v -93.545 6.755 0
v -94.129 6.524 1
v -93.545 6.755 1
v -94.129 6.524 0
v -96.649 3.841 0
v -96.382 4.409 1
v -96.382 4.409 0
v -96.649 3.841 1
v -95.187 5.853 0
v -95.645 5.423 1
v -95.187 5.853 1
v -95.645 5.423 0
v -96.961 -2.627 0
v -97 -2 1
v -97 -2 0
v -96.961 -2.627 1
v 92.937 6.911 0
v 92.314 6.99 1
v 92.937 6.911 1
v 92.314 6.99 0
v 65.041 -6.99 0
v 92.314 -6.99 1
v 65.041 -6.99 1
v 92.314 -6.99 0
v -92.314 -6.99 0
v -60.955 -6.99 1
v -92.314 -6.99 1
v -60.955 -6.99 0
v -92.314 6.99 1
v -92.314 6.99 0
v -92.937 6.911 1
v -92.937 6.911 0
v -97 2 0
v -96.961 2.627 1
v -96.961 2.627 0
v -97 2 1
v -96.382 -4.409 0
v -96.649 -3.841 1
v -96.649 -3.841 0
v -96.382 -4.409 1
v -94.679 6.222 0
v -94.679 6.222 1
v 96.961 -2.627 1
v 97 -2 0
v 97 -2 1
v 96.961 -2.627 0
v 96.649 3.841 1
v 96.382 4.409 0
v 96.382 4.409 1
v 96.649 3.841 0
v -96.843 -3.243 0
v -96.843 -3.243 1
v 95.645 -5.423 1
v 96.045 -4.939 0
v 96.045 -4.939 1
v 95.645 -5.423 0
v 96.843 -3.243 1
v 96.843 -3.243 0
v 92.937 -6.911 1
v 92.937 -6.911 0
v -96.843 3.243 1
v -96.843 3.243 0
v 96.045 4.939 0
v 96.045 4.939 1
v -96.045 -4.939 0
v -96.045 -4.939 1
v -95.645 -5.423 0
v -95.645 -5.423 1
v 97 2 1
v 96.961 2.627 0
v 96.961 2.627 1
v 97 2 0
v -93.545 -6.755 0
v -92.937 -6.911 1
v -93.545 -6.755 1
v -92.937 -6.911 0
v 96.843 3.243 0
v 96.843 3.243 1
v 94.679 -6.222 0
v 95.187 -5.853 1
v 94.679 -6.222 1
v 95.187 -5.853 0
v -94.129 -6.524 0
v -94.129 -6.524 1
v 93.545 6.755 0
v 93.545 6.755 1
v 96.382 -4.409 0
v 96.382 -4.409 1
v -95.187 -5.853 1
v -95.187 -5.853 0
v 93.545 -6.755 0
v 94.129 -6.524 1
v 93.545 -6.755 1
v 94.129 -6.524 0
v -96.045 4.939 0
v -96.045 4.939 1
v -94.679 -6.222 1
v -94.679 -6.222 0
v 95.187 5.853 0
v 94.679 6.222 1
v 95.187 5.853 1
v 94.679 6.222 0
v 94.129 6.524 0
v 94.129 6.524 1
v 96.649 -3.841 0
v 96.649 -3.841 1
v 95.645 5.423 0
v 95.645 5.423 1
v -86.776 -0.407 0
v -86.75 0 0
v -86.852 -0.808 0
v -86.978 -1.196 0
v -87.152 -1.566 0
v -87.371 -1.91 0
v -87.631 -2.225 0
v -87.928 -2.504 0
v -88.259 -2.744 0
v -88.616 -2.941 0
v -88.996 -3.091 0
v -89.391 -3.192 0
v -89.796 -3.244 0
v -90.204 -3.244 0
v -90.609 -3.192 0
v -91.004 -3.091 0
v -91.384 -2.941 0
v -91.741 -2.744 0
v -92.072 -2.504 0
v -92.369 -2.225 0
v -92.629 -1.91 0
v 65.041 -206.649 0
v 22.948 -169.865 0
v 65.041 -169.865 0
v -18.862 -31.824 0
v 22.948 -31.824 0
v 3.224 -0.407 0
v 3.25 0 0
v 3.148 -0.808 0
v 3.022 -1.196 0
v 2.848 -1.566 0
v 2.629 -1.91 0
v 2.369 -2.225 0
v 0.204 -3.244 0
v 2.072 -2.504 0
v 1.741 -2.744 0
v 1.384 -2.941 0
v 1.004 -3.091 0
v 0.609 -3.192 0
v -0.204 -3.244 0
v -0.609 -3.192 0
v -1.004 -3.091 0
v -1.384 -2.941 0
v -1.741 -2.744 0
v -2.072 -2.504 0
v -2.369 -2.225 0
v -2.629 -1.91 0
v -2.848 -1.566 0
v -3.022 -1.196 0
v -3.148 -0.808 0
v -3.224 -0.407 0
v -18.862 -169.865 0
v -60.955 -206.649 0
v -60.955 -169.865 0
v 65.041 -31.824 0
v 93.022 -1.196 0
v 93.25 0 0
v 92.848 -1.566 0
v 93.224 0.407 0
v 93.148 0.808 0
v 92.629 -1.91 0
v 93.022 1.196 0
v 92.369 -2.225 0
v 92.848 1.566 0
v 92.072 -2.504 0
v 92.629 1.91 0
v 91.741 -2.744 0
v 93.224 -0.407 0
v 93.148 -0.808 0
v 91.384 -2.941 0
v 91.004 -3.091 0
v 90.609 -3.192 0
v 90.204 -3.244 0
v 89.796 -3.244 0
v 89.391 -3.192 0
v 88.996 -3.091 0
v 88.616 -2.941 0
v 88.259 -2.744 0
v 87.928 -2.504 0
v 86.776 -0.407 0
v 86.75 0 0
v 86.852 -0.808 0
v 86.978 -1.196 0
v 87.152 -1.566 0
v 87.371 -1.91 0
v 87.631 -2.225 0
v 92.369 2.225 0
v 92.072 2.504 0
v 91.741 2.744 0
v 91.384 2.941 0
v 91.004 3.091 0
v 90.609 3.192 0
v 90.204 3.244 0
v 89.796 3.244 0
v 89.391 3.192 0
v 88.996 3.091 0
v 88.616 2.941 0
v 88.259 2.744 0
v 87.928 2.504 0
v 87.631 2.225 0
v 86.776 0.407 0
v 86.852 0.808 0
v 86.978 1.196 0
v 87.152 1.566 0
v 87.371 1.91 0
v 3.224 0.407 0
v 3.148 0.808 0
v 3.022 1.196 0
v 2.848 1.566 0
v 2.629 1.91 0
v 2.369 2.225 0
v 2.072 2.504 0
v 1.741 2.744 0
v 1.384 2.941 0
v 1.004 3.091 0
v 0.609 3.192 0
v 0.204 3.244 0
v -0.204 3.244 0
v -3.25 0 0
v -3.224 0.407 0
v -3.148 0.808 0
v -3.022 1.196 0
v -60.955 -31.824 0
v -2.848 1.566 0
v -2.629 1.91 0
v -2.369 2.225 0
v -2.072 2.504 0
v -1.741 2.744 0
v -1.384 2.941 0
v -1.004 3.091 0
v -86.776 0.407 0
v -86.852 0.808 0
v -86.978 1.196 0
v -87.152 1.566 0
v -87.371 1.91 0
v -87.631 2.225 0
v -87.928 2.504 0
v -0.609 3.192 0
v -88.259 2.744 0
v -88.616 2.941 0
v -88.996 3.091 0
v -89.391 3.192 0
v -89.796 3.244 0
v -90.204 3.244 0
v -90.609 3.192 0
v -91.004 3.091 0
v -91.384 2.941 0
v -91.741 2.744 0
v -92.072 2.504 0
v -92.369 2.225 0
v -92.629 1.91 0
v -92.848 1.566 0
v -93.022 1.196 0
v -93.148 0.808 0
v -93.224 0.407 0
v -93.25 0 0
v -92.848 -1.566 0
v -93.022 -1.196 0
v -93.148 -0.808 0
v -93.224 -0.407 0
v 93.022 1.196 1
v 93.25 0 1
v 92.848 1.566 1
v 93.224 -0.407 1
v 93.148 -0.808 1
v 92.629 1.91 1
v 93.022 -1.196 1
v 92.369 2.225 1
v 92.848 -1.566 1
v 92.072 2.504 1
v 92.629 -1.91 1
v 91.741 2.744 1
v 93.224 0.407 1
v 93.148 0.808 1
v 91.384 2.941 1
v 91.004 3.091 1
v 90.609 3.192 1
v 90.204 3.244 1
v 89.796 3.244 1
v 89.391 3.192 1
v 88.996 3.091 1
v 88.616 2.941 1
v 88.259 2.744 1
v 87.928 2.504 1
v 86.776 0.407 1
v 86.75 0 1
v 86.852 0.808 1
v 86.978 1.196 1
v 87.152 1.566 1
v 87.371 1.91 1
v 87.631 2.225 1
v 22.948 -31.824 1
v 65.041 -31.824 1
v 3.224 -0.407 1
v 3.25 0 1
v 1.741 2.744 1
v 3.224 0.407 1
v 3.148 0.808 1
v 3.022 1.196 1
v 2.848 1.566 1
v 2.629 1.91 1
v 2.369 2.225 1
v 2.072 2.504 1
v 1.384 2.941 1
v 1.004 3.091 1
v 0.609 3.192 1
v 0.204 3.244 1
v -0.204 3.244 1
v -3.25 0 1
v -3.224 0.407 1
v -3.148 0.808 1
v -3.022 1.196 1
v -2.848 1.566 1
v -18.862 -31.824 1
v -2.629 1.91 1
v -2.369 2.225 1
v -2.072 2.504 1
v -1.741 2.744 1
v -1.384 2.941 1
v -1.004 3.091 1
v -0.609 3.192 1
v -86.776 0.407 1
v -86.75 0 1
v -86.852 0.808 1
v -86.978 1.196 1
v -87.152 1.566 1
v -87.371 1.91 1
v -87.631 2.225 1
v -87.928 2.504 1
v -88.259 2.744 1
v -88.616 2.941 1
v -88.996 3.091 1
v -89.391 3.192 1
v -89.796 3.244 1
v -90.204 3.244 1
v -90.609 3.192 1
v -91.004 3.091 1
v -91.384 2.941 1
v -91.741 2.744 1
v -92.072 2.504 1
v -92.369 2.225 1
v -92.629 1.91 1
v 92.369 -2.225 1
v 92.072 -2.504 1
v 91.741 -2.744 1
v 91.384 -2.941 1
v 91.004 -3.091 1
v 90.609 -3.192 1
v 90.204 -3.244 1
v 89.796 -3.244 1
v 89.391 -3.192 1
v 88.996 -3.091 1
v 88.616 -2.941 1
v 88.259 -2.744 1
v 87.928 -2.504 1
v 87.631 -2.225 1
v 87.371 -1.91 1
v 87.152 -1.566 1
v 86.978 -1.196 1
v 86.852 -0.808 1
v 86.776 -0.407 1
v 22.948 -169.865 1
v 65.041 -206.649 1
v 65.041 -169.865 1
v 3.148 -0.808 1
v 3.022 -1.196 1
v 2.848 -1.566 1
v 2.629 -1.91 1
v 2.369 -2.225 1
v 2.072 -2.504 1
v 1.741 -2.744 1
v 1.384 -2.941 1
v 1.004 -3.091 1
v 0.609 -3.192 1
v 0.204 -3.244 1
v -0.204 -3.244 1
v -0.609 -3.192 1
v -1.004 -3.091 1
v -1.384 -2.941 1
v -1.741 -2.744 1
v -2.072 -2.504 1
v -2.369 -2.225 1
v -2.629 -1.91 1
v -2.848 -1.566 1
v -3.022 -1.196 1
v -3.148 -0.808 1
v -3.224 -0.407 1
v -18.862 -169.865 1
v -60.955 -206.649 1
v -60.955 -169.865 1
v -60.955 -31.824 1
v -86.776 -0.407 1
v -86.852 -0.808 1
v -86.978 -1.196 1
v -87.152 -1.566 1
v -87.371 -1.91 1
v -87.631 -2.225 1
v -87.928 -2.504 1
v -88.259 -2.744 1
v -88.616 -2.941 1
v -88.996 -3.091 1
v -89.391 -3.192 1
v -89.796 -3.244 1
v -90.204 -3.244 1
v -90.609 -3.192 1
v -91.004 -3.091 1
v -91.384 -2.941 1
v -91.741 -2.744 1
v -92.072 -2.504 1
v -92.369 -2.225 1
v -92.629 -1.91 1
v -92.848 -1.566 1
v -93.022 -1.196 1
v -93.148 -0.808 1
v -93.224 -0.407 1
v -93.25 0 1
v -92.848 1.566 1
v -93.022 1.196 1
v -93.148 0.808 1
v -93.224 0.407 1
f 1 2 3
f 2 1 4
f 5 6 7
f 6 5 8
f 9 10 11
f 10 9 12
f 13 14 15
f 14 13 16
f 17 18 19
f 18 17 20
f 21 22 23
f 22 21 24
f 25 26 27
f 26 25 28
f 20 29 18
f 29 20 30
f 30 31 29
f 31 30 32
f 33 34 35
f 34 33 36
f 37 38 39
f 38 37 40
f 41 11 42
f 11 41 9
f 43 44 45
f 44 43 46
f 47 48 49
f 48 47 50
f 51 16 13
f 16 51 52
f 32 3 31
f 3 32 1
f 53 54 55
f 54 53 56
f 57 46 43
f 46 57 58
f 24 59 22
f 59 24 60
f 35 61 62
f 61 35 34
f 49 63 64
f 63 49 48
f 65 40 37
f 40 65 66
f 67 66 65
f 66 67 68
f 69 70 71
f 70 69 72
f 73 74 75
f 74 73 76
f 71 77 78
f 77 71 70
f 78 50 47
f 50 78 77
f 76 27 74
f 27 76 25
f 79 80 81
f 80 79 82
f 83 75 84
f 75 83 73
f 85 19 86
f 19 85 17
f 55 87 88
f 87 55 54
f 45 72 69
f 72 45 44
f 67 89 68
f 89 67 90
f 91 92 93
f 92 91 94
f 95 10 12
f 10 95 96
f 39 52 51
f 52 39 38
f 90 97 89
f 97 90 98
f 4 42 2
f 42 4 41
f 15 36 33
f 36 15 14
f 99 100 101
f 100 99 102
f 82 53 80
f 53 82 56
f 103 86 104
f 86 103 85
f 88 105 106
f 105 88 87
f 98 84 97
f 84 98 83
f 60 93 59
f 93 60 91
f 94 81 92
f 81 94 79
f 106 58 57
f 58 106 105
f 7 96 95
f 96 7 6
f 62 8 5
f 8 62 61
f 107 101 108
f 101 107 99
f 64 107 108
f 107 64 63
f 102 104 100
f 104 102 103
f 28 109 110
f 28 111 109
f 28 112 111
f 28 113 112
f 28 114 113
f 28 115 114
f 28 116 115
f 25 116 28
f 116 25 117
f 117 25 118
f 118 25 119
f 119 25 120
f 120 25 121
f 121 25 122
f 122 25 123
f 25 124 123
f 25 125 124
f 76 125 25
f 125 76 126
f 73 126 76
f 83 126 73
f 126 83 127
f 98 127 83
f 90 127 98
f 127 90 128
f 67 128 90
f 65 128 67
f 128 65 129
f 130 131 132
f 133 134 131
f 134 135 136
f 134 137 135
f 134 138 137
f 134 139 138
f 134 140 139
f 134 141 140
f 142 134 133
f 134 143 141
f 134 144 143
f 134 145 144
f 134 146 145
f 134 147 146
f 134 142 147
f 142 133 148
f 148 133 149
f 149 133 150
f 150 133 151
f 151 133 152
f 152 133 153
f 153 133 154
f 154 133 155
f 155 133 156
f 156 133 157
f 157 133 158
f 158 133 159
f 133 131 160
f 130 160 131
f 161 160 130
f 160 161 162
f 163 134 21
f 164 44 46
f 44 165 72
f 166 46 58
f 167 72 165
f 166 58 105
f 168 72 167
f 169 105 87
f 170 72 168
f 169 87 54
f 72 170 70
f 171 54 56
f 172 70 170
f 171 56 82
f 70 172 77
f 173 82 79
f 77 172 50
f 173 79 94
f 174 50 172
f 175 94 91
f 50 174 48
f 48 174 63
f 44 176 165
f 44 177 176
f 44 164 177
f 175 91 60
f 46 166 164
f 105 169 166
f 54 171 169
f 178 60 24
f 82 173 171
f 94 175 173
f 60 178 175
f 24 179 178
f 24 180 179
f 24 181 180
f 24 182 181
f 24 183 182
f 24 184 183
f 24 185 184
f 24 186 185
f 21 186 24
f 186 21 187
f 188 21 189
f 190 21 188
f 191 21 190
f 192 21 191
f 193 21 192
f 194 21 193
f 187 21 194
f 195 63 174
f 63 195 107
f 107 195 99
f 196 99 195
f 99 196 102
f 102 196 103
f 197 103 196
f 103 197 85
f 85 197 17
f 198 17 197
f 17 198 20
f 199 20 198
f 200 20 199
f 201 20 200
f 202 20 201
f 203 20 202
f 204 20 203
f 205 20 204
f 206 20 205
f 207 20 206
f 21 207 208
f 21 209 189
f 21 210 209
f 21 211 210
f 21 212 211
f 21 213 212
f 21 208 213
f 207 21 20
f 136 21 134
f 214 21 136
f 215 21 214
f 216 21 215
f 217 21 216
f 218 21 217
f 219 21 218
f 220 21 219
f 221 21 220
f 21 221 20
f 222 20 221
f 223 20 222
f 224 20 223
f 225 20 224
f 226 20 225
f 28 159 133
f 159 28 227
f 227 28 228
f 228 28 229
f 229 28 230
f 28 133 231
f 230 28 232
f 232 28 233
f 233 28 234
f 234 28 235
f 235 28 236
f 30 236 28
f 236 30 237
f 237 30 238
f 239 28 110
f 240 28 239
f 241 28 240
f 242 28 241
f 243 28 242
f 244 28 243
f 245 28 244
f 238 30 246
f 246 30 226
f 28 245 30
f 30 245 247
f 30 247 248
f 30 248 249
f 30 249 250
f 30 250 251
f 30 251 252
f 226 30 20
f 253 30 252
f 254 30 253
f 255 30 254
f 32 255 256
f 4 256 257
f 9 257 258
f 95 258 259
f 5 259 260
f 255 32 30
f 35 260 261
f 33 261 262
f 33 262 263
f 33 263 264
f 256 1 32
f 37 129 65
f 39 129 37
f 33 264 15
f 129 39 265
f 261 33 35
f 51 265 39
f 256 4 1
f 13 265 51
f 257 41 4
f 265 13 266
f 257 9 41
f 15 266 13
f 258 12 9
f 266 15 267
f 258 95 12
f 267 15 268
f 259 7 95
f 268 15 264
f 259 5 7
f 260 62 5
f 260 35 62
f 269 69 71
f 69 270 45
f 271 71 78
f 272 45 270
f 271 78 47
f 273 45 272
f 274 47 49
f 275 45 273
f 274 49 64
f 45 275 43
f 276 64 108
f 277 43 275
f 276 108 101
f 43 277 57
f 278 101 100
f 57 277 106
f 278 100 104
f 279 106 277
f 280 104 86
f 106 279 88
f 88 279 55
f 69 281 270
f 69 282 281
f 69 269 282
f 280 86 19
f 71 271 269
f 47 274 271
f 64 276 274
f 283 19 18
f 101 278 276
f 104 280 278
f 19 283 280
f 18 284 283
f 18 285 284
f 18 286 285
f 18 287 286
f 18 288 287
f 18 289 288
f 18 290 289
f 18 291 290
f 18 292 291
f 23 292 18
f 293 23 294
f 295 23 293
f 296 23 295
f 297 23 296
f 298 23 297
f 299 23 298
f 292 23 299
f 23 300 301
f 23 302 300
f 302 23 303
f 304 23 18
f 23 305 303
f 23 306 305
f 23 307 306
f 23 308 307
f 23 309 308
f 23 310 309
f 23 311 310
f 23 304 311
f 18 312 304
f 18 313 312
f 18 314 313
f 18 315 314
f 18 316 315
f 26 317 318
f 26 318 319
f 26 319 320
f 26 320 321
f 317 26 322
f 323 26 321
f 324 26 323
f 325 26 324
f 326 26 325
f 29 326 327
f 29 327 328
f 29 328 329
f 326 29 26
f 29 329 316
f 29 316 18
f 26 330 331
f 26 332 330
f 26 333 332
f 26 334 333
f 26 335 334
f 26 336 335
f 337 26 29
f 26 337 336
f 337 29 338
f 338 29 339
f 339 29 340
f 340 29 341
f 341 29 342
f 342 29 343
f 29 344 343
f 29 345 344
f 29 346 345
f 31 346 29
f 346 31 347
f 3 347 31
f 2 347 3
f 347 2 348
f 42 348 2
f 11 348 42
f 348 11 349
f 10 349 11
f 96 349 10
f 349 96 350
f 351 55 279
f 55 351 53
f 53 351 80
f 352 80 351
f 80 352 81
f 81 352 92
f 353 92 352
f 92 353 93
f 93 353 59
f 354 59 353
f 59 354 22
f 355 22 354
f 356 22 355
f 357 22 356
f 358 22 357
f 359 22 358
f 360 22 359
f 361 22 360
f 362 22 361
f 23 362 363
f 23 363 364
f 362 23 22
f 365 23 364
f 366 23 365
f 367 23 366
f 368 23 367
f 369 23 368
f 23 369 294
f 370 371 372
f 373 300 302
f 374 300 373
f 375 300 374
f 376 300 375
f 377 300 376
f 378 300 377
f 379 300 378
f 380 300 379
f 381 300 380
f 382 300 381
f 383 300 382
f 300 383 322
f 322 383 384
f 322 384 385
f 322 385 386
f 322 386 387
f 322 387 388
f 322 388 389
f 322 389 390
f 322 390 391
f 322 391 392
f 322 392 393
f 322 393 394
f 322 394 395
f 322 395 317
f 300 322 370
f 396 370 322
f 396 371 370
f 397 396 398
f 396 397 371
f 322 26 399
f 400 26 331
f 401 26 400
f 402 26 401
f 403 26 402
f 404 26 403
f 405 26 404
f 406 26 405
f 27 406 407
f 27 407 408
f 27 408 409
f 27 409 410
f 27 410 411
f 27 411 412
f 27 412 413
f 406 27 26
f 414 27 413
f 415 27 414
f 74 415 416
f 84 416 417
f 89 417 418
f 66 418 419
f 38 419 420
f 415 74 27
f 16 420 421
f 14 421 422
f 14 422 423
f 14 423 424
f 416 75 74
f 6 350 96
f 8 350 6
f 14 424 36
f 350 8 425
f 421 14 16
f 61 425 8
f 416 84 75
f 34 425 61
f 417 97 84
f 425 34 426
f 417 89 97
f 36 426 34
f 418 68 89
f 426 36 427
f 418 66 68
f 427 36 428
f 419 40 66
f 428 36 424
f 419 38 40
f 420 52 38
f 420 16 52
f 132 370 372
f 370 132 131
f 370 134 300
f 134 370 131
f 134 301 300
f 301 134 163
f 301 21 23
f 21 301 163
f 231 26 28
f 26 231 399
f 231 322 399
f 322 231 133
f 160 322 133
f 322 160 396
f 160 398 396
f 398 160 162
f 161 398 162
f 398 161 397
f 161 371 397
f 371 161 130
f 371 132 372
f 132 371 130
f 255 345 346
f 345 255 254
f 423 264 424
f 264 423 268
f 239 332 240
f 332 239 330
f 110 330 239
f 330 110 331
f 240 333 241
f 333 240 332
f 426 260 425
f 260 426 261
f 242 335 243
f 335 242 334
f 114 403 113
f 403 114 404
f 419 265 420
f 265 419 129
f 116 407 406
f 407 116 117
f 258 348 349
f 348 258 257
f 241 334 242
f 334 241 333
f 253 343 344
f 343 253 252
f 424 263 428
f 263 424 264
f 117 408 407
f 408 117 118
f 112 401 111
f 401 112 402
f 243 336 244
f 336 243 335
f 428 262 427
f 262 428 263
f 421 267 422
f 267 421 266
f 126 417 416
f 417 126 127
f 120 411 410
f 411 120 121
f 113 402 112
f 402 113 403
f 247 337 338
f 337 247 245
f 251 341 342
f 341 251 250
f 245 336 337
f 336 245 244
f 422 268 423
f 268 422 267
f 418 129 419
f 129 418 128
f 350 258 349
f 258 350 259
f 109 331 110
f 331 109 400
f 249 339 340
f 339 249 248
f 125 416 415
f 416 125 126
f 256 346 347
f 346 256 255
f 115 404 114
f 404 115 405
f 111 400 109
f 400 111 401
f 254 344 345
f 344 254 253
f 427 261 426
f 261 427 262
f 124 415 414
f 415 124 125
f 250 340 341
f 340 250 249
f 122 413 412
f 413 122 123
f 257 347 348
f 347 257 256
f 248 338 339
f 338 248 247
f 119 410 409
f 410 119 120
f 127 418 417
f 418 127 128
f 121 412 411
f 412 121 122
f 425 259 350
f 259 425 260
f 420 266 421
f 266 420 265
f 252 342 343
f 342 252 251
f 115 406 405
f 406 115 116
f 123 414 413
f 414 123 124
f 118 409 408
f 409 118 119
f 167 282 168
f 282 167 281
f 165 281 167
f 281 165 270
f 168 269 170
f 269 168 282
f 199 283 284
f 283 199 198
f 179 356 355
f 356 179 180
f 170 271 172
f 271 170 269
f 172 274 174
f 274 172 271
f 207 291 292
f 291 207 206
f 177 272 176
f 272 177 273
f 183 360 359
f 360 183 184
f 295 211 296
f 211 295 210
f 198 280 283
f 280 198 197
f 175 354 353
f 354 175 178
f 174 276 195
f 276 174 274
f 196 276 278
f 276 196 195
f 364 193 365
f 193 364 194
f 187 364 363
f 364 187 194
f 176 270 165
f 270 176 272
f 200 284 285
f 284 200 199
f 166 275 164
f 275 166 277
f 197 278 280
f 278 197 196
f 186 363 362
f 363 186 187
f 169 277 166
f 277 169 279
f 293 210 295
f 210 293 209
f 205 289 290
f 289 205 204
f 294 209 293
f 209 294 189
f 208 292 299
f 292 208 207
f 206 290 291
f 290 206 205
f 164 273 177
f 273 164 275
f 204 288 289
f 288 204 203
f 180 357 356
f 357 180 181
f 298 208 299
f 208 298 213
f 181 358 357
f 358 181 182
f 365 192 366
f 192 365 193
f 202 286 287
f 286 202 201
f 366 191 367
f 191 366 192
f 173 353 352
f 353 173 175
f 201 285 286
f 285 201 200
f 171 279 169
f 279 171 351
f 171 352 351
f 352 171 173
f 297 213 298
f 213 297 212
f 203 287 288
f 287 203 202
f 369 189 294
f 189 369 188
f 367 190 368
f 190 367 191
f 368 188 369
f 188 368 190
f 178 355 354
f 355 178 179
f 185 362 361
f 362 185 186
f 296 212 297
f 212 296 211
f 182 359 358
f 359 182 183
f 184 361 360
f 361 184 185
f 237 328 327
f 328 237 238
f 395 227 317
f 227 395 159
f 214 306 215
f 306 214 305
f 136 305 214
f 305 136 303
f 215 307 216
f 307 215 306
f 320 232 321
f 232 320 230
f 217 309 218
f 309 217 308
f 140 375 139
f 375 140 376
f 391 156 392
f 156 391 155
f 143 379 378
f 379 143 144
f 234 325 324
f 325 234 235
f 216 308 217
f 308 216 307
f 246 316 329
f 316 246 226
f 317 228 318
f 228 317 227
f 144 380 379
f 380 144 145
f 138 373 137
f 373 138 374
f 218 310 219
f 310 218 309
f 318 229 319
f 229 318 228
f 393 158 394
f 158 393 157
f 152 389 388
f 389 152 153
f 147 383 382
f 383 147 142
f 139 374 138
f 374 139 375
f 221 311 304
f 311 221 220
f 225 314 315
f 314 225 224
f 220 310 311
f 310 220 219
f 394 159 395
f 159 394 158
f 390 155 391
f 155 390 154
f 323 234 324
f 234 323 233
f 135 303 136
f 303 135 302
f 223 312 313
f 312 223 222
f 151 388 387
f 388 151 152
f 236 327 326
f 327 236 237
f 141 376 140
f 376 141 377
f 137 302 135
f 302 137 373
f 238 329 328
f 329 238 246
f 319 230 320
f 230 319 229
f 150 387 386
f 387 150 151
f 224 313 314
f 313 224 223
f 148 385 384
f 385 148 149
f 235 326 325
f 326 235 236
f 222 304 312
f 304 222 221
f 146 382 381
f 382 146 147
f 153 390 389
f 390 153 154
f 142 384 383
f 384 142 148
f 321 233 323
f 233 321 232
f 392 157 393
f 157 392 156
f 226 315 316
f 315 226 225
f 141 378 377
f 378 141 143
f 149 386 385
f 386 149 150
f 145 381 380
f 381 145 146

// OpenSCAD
$fn = 50;


difference() {
	union() {
		translate(v = [0, 0, 0]) {
			rotate(a = [0, 0, 0]) {
				hull() {
					translate(v = [-92.0000000000, 2.0000000000, 0]) {
						rotate(a = [0, 0, 0]) {
							translate(v = [0, 0, 0]) {
								rotate(a = [0, 0, 0]) {
									cylinder(h = 1, r = 5);
								}
							}
						}
					}
					translate(v = [92.0000000000, 2.0000000000, 0]) {
						rotate(a = [0, 0, 0]) {
							translate(v = [0, 0, 0]) {
								rotate(a = [0, 0, 0]) {
									cylinder(h = 1, r = 5);
								}
							}
						}
					}
					translate(v = [-92.0000000000, -2.0000000000, 0]) {
						rotate(a = [0, 0, 0]) {
							translate(v = [0, 0, 0]) {
								rotate(a = [0, 0, 0]) {
									cylinder(h = 1, r = 5);
								}
							}
						}
					}
					translate(v = [92.0000000000, -2.0000000000, 0]) {
						rotate(a = [0, 0, 0]) {
							translate(v = [0, 0, 0]) {
								rotate(a = [0, 0, 0]) {
									cylinder(h = 1, r = 5);
								}
							}
						}
					}
				}
			}
		}
		translate(v = [0, 0, 0]) {
			rotate(a = [0, 0, 0]) {
				linear_extrude(height = 1) {
					text(font = "DejaVu Sans Mono:style=Bold", halign = "center", size = 209.0000000000, text = "I", valign = "top");
				}
			}
		}
	}
	union() {
		translate(v = [-90.0000000000, 0.0000000000, -125.0000000000]) {
			rotate(a = [0, 0, 0]) {
				cylinder(h = 250, r = 3.2500000000);
			}
		}
		translate(v = [90.0000000000, 0.0000000000, -125.0000000000]) {
			rotate(a = [0, 0, 0]) {
				cylinder(h = 250, r = 3.2500000000);
			}
		}
		translate(v = [90.0000000000, 0.0000000000, -125.0000000000]) {
			rotate(a = [0, 0, 0]) {
				cylinder(h = 250, r = 3.2500000000);
			}
		}
		translate(v = [0, 0, -125.0000000000]) {
			rotate(a = [0, 0, 0]) {
				cylinder(h = 250, r = 3.2500000000);
			}
		}
	}
}
